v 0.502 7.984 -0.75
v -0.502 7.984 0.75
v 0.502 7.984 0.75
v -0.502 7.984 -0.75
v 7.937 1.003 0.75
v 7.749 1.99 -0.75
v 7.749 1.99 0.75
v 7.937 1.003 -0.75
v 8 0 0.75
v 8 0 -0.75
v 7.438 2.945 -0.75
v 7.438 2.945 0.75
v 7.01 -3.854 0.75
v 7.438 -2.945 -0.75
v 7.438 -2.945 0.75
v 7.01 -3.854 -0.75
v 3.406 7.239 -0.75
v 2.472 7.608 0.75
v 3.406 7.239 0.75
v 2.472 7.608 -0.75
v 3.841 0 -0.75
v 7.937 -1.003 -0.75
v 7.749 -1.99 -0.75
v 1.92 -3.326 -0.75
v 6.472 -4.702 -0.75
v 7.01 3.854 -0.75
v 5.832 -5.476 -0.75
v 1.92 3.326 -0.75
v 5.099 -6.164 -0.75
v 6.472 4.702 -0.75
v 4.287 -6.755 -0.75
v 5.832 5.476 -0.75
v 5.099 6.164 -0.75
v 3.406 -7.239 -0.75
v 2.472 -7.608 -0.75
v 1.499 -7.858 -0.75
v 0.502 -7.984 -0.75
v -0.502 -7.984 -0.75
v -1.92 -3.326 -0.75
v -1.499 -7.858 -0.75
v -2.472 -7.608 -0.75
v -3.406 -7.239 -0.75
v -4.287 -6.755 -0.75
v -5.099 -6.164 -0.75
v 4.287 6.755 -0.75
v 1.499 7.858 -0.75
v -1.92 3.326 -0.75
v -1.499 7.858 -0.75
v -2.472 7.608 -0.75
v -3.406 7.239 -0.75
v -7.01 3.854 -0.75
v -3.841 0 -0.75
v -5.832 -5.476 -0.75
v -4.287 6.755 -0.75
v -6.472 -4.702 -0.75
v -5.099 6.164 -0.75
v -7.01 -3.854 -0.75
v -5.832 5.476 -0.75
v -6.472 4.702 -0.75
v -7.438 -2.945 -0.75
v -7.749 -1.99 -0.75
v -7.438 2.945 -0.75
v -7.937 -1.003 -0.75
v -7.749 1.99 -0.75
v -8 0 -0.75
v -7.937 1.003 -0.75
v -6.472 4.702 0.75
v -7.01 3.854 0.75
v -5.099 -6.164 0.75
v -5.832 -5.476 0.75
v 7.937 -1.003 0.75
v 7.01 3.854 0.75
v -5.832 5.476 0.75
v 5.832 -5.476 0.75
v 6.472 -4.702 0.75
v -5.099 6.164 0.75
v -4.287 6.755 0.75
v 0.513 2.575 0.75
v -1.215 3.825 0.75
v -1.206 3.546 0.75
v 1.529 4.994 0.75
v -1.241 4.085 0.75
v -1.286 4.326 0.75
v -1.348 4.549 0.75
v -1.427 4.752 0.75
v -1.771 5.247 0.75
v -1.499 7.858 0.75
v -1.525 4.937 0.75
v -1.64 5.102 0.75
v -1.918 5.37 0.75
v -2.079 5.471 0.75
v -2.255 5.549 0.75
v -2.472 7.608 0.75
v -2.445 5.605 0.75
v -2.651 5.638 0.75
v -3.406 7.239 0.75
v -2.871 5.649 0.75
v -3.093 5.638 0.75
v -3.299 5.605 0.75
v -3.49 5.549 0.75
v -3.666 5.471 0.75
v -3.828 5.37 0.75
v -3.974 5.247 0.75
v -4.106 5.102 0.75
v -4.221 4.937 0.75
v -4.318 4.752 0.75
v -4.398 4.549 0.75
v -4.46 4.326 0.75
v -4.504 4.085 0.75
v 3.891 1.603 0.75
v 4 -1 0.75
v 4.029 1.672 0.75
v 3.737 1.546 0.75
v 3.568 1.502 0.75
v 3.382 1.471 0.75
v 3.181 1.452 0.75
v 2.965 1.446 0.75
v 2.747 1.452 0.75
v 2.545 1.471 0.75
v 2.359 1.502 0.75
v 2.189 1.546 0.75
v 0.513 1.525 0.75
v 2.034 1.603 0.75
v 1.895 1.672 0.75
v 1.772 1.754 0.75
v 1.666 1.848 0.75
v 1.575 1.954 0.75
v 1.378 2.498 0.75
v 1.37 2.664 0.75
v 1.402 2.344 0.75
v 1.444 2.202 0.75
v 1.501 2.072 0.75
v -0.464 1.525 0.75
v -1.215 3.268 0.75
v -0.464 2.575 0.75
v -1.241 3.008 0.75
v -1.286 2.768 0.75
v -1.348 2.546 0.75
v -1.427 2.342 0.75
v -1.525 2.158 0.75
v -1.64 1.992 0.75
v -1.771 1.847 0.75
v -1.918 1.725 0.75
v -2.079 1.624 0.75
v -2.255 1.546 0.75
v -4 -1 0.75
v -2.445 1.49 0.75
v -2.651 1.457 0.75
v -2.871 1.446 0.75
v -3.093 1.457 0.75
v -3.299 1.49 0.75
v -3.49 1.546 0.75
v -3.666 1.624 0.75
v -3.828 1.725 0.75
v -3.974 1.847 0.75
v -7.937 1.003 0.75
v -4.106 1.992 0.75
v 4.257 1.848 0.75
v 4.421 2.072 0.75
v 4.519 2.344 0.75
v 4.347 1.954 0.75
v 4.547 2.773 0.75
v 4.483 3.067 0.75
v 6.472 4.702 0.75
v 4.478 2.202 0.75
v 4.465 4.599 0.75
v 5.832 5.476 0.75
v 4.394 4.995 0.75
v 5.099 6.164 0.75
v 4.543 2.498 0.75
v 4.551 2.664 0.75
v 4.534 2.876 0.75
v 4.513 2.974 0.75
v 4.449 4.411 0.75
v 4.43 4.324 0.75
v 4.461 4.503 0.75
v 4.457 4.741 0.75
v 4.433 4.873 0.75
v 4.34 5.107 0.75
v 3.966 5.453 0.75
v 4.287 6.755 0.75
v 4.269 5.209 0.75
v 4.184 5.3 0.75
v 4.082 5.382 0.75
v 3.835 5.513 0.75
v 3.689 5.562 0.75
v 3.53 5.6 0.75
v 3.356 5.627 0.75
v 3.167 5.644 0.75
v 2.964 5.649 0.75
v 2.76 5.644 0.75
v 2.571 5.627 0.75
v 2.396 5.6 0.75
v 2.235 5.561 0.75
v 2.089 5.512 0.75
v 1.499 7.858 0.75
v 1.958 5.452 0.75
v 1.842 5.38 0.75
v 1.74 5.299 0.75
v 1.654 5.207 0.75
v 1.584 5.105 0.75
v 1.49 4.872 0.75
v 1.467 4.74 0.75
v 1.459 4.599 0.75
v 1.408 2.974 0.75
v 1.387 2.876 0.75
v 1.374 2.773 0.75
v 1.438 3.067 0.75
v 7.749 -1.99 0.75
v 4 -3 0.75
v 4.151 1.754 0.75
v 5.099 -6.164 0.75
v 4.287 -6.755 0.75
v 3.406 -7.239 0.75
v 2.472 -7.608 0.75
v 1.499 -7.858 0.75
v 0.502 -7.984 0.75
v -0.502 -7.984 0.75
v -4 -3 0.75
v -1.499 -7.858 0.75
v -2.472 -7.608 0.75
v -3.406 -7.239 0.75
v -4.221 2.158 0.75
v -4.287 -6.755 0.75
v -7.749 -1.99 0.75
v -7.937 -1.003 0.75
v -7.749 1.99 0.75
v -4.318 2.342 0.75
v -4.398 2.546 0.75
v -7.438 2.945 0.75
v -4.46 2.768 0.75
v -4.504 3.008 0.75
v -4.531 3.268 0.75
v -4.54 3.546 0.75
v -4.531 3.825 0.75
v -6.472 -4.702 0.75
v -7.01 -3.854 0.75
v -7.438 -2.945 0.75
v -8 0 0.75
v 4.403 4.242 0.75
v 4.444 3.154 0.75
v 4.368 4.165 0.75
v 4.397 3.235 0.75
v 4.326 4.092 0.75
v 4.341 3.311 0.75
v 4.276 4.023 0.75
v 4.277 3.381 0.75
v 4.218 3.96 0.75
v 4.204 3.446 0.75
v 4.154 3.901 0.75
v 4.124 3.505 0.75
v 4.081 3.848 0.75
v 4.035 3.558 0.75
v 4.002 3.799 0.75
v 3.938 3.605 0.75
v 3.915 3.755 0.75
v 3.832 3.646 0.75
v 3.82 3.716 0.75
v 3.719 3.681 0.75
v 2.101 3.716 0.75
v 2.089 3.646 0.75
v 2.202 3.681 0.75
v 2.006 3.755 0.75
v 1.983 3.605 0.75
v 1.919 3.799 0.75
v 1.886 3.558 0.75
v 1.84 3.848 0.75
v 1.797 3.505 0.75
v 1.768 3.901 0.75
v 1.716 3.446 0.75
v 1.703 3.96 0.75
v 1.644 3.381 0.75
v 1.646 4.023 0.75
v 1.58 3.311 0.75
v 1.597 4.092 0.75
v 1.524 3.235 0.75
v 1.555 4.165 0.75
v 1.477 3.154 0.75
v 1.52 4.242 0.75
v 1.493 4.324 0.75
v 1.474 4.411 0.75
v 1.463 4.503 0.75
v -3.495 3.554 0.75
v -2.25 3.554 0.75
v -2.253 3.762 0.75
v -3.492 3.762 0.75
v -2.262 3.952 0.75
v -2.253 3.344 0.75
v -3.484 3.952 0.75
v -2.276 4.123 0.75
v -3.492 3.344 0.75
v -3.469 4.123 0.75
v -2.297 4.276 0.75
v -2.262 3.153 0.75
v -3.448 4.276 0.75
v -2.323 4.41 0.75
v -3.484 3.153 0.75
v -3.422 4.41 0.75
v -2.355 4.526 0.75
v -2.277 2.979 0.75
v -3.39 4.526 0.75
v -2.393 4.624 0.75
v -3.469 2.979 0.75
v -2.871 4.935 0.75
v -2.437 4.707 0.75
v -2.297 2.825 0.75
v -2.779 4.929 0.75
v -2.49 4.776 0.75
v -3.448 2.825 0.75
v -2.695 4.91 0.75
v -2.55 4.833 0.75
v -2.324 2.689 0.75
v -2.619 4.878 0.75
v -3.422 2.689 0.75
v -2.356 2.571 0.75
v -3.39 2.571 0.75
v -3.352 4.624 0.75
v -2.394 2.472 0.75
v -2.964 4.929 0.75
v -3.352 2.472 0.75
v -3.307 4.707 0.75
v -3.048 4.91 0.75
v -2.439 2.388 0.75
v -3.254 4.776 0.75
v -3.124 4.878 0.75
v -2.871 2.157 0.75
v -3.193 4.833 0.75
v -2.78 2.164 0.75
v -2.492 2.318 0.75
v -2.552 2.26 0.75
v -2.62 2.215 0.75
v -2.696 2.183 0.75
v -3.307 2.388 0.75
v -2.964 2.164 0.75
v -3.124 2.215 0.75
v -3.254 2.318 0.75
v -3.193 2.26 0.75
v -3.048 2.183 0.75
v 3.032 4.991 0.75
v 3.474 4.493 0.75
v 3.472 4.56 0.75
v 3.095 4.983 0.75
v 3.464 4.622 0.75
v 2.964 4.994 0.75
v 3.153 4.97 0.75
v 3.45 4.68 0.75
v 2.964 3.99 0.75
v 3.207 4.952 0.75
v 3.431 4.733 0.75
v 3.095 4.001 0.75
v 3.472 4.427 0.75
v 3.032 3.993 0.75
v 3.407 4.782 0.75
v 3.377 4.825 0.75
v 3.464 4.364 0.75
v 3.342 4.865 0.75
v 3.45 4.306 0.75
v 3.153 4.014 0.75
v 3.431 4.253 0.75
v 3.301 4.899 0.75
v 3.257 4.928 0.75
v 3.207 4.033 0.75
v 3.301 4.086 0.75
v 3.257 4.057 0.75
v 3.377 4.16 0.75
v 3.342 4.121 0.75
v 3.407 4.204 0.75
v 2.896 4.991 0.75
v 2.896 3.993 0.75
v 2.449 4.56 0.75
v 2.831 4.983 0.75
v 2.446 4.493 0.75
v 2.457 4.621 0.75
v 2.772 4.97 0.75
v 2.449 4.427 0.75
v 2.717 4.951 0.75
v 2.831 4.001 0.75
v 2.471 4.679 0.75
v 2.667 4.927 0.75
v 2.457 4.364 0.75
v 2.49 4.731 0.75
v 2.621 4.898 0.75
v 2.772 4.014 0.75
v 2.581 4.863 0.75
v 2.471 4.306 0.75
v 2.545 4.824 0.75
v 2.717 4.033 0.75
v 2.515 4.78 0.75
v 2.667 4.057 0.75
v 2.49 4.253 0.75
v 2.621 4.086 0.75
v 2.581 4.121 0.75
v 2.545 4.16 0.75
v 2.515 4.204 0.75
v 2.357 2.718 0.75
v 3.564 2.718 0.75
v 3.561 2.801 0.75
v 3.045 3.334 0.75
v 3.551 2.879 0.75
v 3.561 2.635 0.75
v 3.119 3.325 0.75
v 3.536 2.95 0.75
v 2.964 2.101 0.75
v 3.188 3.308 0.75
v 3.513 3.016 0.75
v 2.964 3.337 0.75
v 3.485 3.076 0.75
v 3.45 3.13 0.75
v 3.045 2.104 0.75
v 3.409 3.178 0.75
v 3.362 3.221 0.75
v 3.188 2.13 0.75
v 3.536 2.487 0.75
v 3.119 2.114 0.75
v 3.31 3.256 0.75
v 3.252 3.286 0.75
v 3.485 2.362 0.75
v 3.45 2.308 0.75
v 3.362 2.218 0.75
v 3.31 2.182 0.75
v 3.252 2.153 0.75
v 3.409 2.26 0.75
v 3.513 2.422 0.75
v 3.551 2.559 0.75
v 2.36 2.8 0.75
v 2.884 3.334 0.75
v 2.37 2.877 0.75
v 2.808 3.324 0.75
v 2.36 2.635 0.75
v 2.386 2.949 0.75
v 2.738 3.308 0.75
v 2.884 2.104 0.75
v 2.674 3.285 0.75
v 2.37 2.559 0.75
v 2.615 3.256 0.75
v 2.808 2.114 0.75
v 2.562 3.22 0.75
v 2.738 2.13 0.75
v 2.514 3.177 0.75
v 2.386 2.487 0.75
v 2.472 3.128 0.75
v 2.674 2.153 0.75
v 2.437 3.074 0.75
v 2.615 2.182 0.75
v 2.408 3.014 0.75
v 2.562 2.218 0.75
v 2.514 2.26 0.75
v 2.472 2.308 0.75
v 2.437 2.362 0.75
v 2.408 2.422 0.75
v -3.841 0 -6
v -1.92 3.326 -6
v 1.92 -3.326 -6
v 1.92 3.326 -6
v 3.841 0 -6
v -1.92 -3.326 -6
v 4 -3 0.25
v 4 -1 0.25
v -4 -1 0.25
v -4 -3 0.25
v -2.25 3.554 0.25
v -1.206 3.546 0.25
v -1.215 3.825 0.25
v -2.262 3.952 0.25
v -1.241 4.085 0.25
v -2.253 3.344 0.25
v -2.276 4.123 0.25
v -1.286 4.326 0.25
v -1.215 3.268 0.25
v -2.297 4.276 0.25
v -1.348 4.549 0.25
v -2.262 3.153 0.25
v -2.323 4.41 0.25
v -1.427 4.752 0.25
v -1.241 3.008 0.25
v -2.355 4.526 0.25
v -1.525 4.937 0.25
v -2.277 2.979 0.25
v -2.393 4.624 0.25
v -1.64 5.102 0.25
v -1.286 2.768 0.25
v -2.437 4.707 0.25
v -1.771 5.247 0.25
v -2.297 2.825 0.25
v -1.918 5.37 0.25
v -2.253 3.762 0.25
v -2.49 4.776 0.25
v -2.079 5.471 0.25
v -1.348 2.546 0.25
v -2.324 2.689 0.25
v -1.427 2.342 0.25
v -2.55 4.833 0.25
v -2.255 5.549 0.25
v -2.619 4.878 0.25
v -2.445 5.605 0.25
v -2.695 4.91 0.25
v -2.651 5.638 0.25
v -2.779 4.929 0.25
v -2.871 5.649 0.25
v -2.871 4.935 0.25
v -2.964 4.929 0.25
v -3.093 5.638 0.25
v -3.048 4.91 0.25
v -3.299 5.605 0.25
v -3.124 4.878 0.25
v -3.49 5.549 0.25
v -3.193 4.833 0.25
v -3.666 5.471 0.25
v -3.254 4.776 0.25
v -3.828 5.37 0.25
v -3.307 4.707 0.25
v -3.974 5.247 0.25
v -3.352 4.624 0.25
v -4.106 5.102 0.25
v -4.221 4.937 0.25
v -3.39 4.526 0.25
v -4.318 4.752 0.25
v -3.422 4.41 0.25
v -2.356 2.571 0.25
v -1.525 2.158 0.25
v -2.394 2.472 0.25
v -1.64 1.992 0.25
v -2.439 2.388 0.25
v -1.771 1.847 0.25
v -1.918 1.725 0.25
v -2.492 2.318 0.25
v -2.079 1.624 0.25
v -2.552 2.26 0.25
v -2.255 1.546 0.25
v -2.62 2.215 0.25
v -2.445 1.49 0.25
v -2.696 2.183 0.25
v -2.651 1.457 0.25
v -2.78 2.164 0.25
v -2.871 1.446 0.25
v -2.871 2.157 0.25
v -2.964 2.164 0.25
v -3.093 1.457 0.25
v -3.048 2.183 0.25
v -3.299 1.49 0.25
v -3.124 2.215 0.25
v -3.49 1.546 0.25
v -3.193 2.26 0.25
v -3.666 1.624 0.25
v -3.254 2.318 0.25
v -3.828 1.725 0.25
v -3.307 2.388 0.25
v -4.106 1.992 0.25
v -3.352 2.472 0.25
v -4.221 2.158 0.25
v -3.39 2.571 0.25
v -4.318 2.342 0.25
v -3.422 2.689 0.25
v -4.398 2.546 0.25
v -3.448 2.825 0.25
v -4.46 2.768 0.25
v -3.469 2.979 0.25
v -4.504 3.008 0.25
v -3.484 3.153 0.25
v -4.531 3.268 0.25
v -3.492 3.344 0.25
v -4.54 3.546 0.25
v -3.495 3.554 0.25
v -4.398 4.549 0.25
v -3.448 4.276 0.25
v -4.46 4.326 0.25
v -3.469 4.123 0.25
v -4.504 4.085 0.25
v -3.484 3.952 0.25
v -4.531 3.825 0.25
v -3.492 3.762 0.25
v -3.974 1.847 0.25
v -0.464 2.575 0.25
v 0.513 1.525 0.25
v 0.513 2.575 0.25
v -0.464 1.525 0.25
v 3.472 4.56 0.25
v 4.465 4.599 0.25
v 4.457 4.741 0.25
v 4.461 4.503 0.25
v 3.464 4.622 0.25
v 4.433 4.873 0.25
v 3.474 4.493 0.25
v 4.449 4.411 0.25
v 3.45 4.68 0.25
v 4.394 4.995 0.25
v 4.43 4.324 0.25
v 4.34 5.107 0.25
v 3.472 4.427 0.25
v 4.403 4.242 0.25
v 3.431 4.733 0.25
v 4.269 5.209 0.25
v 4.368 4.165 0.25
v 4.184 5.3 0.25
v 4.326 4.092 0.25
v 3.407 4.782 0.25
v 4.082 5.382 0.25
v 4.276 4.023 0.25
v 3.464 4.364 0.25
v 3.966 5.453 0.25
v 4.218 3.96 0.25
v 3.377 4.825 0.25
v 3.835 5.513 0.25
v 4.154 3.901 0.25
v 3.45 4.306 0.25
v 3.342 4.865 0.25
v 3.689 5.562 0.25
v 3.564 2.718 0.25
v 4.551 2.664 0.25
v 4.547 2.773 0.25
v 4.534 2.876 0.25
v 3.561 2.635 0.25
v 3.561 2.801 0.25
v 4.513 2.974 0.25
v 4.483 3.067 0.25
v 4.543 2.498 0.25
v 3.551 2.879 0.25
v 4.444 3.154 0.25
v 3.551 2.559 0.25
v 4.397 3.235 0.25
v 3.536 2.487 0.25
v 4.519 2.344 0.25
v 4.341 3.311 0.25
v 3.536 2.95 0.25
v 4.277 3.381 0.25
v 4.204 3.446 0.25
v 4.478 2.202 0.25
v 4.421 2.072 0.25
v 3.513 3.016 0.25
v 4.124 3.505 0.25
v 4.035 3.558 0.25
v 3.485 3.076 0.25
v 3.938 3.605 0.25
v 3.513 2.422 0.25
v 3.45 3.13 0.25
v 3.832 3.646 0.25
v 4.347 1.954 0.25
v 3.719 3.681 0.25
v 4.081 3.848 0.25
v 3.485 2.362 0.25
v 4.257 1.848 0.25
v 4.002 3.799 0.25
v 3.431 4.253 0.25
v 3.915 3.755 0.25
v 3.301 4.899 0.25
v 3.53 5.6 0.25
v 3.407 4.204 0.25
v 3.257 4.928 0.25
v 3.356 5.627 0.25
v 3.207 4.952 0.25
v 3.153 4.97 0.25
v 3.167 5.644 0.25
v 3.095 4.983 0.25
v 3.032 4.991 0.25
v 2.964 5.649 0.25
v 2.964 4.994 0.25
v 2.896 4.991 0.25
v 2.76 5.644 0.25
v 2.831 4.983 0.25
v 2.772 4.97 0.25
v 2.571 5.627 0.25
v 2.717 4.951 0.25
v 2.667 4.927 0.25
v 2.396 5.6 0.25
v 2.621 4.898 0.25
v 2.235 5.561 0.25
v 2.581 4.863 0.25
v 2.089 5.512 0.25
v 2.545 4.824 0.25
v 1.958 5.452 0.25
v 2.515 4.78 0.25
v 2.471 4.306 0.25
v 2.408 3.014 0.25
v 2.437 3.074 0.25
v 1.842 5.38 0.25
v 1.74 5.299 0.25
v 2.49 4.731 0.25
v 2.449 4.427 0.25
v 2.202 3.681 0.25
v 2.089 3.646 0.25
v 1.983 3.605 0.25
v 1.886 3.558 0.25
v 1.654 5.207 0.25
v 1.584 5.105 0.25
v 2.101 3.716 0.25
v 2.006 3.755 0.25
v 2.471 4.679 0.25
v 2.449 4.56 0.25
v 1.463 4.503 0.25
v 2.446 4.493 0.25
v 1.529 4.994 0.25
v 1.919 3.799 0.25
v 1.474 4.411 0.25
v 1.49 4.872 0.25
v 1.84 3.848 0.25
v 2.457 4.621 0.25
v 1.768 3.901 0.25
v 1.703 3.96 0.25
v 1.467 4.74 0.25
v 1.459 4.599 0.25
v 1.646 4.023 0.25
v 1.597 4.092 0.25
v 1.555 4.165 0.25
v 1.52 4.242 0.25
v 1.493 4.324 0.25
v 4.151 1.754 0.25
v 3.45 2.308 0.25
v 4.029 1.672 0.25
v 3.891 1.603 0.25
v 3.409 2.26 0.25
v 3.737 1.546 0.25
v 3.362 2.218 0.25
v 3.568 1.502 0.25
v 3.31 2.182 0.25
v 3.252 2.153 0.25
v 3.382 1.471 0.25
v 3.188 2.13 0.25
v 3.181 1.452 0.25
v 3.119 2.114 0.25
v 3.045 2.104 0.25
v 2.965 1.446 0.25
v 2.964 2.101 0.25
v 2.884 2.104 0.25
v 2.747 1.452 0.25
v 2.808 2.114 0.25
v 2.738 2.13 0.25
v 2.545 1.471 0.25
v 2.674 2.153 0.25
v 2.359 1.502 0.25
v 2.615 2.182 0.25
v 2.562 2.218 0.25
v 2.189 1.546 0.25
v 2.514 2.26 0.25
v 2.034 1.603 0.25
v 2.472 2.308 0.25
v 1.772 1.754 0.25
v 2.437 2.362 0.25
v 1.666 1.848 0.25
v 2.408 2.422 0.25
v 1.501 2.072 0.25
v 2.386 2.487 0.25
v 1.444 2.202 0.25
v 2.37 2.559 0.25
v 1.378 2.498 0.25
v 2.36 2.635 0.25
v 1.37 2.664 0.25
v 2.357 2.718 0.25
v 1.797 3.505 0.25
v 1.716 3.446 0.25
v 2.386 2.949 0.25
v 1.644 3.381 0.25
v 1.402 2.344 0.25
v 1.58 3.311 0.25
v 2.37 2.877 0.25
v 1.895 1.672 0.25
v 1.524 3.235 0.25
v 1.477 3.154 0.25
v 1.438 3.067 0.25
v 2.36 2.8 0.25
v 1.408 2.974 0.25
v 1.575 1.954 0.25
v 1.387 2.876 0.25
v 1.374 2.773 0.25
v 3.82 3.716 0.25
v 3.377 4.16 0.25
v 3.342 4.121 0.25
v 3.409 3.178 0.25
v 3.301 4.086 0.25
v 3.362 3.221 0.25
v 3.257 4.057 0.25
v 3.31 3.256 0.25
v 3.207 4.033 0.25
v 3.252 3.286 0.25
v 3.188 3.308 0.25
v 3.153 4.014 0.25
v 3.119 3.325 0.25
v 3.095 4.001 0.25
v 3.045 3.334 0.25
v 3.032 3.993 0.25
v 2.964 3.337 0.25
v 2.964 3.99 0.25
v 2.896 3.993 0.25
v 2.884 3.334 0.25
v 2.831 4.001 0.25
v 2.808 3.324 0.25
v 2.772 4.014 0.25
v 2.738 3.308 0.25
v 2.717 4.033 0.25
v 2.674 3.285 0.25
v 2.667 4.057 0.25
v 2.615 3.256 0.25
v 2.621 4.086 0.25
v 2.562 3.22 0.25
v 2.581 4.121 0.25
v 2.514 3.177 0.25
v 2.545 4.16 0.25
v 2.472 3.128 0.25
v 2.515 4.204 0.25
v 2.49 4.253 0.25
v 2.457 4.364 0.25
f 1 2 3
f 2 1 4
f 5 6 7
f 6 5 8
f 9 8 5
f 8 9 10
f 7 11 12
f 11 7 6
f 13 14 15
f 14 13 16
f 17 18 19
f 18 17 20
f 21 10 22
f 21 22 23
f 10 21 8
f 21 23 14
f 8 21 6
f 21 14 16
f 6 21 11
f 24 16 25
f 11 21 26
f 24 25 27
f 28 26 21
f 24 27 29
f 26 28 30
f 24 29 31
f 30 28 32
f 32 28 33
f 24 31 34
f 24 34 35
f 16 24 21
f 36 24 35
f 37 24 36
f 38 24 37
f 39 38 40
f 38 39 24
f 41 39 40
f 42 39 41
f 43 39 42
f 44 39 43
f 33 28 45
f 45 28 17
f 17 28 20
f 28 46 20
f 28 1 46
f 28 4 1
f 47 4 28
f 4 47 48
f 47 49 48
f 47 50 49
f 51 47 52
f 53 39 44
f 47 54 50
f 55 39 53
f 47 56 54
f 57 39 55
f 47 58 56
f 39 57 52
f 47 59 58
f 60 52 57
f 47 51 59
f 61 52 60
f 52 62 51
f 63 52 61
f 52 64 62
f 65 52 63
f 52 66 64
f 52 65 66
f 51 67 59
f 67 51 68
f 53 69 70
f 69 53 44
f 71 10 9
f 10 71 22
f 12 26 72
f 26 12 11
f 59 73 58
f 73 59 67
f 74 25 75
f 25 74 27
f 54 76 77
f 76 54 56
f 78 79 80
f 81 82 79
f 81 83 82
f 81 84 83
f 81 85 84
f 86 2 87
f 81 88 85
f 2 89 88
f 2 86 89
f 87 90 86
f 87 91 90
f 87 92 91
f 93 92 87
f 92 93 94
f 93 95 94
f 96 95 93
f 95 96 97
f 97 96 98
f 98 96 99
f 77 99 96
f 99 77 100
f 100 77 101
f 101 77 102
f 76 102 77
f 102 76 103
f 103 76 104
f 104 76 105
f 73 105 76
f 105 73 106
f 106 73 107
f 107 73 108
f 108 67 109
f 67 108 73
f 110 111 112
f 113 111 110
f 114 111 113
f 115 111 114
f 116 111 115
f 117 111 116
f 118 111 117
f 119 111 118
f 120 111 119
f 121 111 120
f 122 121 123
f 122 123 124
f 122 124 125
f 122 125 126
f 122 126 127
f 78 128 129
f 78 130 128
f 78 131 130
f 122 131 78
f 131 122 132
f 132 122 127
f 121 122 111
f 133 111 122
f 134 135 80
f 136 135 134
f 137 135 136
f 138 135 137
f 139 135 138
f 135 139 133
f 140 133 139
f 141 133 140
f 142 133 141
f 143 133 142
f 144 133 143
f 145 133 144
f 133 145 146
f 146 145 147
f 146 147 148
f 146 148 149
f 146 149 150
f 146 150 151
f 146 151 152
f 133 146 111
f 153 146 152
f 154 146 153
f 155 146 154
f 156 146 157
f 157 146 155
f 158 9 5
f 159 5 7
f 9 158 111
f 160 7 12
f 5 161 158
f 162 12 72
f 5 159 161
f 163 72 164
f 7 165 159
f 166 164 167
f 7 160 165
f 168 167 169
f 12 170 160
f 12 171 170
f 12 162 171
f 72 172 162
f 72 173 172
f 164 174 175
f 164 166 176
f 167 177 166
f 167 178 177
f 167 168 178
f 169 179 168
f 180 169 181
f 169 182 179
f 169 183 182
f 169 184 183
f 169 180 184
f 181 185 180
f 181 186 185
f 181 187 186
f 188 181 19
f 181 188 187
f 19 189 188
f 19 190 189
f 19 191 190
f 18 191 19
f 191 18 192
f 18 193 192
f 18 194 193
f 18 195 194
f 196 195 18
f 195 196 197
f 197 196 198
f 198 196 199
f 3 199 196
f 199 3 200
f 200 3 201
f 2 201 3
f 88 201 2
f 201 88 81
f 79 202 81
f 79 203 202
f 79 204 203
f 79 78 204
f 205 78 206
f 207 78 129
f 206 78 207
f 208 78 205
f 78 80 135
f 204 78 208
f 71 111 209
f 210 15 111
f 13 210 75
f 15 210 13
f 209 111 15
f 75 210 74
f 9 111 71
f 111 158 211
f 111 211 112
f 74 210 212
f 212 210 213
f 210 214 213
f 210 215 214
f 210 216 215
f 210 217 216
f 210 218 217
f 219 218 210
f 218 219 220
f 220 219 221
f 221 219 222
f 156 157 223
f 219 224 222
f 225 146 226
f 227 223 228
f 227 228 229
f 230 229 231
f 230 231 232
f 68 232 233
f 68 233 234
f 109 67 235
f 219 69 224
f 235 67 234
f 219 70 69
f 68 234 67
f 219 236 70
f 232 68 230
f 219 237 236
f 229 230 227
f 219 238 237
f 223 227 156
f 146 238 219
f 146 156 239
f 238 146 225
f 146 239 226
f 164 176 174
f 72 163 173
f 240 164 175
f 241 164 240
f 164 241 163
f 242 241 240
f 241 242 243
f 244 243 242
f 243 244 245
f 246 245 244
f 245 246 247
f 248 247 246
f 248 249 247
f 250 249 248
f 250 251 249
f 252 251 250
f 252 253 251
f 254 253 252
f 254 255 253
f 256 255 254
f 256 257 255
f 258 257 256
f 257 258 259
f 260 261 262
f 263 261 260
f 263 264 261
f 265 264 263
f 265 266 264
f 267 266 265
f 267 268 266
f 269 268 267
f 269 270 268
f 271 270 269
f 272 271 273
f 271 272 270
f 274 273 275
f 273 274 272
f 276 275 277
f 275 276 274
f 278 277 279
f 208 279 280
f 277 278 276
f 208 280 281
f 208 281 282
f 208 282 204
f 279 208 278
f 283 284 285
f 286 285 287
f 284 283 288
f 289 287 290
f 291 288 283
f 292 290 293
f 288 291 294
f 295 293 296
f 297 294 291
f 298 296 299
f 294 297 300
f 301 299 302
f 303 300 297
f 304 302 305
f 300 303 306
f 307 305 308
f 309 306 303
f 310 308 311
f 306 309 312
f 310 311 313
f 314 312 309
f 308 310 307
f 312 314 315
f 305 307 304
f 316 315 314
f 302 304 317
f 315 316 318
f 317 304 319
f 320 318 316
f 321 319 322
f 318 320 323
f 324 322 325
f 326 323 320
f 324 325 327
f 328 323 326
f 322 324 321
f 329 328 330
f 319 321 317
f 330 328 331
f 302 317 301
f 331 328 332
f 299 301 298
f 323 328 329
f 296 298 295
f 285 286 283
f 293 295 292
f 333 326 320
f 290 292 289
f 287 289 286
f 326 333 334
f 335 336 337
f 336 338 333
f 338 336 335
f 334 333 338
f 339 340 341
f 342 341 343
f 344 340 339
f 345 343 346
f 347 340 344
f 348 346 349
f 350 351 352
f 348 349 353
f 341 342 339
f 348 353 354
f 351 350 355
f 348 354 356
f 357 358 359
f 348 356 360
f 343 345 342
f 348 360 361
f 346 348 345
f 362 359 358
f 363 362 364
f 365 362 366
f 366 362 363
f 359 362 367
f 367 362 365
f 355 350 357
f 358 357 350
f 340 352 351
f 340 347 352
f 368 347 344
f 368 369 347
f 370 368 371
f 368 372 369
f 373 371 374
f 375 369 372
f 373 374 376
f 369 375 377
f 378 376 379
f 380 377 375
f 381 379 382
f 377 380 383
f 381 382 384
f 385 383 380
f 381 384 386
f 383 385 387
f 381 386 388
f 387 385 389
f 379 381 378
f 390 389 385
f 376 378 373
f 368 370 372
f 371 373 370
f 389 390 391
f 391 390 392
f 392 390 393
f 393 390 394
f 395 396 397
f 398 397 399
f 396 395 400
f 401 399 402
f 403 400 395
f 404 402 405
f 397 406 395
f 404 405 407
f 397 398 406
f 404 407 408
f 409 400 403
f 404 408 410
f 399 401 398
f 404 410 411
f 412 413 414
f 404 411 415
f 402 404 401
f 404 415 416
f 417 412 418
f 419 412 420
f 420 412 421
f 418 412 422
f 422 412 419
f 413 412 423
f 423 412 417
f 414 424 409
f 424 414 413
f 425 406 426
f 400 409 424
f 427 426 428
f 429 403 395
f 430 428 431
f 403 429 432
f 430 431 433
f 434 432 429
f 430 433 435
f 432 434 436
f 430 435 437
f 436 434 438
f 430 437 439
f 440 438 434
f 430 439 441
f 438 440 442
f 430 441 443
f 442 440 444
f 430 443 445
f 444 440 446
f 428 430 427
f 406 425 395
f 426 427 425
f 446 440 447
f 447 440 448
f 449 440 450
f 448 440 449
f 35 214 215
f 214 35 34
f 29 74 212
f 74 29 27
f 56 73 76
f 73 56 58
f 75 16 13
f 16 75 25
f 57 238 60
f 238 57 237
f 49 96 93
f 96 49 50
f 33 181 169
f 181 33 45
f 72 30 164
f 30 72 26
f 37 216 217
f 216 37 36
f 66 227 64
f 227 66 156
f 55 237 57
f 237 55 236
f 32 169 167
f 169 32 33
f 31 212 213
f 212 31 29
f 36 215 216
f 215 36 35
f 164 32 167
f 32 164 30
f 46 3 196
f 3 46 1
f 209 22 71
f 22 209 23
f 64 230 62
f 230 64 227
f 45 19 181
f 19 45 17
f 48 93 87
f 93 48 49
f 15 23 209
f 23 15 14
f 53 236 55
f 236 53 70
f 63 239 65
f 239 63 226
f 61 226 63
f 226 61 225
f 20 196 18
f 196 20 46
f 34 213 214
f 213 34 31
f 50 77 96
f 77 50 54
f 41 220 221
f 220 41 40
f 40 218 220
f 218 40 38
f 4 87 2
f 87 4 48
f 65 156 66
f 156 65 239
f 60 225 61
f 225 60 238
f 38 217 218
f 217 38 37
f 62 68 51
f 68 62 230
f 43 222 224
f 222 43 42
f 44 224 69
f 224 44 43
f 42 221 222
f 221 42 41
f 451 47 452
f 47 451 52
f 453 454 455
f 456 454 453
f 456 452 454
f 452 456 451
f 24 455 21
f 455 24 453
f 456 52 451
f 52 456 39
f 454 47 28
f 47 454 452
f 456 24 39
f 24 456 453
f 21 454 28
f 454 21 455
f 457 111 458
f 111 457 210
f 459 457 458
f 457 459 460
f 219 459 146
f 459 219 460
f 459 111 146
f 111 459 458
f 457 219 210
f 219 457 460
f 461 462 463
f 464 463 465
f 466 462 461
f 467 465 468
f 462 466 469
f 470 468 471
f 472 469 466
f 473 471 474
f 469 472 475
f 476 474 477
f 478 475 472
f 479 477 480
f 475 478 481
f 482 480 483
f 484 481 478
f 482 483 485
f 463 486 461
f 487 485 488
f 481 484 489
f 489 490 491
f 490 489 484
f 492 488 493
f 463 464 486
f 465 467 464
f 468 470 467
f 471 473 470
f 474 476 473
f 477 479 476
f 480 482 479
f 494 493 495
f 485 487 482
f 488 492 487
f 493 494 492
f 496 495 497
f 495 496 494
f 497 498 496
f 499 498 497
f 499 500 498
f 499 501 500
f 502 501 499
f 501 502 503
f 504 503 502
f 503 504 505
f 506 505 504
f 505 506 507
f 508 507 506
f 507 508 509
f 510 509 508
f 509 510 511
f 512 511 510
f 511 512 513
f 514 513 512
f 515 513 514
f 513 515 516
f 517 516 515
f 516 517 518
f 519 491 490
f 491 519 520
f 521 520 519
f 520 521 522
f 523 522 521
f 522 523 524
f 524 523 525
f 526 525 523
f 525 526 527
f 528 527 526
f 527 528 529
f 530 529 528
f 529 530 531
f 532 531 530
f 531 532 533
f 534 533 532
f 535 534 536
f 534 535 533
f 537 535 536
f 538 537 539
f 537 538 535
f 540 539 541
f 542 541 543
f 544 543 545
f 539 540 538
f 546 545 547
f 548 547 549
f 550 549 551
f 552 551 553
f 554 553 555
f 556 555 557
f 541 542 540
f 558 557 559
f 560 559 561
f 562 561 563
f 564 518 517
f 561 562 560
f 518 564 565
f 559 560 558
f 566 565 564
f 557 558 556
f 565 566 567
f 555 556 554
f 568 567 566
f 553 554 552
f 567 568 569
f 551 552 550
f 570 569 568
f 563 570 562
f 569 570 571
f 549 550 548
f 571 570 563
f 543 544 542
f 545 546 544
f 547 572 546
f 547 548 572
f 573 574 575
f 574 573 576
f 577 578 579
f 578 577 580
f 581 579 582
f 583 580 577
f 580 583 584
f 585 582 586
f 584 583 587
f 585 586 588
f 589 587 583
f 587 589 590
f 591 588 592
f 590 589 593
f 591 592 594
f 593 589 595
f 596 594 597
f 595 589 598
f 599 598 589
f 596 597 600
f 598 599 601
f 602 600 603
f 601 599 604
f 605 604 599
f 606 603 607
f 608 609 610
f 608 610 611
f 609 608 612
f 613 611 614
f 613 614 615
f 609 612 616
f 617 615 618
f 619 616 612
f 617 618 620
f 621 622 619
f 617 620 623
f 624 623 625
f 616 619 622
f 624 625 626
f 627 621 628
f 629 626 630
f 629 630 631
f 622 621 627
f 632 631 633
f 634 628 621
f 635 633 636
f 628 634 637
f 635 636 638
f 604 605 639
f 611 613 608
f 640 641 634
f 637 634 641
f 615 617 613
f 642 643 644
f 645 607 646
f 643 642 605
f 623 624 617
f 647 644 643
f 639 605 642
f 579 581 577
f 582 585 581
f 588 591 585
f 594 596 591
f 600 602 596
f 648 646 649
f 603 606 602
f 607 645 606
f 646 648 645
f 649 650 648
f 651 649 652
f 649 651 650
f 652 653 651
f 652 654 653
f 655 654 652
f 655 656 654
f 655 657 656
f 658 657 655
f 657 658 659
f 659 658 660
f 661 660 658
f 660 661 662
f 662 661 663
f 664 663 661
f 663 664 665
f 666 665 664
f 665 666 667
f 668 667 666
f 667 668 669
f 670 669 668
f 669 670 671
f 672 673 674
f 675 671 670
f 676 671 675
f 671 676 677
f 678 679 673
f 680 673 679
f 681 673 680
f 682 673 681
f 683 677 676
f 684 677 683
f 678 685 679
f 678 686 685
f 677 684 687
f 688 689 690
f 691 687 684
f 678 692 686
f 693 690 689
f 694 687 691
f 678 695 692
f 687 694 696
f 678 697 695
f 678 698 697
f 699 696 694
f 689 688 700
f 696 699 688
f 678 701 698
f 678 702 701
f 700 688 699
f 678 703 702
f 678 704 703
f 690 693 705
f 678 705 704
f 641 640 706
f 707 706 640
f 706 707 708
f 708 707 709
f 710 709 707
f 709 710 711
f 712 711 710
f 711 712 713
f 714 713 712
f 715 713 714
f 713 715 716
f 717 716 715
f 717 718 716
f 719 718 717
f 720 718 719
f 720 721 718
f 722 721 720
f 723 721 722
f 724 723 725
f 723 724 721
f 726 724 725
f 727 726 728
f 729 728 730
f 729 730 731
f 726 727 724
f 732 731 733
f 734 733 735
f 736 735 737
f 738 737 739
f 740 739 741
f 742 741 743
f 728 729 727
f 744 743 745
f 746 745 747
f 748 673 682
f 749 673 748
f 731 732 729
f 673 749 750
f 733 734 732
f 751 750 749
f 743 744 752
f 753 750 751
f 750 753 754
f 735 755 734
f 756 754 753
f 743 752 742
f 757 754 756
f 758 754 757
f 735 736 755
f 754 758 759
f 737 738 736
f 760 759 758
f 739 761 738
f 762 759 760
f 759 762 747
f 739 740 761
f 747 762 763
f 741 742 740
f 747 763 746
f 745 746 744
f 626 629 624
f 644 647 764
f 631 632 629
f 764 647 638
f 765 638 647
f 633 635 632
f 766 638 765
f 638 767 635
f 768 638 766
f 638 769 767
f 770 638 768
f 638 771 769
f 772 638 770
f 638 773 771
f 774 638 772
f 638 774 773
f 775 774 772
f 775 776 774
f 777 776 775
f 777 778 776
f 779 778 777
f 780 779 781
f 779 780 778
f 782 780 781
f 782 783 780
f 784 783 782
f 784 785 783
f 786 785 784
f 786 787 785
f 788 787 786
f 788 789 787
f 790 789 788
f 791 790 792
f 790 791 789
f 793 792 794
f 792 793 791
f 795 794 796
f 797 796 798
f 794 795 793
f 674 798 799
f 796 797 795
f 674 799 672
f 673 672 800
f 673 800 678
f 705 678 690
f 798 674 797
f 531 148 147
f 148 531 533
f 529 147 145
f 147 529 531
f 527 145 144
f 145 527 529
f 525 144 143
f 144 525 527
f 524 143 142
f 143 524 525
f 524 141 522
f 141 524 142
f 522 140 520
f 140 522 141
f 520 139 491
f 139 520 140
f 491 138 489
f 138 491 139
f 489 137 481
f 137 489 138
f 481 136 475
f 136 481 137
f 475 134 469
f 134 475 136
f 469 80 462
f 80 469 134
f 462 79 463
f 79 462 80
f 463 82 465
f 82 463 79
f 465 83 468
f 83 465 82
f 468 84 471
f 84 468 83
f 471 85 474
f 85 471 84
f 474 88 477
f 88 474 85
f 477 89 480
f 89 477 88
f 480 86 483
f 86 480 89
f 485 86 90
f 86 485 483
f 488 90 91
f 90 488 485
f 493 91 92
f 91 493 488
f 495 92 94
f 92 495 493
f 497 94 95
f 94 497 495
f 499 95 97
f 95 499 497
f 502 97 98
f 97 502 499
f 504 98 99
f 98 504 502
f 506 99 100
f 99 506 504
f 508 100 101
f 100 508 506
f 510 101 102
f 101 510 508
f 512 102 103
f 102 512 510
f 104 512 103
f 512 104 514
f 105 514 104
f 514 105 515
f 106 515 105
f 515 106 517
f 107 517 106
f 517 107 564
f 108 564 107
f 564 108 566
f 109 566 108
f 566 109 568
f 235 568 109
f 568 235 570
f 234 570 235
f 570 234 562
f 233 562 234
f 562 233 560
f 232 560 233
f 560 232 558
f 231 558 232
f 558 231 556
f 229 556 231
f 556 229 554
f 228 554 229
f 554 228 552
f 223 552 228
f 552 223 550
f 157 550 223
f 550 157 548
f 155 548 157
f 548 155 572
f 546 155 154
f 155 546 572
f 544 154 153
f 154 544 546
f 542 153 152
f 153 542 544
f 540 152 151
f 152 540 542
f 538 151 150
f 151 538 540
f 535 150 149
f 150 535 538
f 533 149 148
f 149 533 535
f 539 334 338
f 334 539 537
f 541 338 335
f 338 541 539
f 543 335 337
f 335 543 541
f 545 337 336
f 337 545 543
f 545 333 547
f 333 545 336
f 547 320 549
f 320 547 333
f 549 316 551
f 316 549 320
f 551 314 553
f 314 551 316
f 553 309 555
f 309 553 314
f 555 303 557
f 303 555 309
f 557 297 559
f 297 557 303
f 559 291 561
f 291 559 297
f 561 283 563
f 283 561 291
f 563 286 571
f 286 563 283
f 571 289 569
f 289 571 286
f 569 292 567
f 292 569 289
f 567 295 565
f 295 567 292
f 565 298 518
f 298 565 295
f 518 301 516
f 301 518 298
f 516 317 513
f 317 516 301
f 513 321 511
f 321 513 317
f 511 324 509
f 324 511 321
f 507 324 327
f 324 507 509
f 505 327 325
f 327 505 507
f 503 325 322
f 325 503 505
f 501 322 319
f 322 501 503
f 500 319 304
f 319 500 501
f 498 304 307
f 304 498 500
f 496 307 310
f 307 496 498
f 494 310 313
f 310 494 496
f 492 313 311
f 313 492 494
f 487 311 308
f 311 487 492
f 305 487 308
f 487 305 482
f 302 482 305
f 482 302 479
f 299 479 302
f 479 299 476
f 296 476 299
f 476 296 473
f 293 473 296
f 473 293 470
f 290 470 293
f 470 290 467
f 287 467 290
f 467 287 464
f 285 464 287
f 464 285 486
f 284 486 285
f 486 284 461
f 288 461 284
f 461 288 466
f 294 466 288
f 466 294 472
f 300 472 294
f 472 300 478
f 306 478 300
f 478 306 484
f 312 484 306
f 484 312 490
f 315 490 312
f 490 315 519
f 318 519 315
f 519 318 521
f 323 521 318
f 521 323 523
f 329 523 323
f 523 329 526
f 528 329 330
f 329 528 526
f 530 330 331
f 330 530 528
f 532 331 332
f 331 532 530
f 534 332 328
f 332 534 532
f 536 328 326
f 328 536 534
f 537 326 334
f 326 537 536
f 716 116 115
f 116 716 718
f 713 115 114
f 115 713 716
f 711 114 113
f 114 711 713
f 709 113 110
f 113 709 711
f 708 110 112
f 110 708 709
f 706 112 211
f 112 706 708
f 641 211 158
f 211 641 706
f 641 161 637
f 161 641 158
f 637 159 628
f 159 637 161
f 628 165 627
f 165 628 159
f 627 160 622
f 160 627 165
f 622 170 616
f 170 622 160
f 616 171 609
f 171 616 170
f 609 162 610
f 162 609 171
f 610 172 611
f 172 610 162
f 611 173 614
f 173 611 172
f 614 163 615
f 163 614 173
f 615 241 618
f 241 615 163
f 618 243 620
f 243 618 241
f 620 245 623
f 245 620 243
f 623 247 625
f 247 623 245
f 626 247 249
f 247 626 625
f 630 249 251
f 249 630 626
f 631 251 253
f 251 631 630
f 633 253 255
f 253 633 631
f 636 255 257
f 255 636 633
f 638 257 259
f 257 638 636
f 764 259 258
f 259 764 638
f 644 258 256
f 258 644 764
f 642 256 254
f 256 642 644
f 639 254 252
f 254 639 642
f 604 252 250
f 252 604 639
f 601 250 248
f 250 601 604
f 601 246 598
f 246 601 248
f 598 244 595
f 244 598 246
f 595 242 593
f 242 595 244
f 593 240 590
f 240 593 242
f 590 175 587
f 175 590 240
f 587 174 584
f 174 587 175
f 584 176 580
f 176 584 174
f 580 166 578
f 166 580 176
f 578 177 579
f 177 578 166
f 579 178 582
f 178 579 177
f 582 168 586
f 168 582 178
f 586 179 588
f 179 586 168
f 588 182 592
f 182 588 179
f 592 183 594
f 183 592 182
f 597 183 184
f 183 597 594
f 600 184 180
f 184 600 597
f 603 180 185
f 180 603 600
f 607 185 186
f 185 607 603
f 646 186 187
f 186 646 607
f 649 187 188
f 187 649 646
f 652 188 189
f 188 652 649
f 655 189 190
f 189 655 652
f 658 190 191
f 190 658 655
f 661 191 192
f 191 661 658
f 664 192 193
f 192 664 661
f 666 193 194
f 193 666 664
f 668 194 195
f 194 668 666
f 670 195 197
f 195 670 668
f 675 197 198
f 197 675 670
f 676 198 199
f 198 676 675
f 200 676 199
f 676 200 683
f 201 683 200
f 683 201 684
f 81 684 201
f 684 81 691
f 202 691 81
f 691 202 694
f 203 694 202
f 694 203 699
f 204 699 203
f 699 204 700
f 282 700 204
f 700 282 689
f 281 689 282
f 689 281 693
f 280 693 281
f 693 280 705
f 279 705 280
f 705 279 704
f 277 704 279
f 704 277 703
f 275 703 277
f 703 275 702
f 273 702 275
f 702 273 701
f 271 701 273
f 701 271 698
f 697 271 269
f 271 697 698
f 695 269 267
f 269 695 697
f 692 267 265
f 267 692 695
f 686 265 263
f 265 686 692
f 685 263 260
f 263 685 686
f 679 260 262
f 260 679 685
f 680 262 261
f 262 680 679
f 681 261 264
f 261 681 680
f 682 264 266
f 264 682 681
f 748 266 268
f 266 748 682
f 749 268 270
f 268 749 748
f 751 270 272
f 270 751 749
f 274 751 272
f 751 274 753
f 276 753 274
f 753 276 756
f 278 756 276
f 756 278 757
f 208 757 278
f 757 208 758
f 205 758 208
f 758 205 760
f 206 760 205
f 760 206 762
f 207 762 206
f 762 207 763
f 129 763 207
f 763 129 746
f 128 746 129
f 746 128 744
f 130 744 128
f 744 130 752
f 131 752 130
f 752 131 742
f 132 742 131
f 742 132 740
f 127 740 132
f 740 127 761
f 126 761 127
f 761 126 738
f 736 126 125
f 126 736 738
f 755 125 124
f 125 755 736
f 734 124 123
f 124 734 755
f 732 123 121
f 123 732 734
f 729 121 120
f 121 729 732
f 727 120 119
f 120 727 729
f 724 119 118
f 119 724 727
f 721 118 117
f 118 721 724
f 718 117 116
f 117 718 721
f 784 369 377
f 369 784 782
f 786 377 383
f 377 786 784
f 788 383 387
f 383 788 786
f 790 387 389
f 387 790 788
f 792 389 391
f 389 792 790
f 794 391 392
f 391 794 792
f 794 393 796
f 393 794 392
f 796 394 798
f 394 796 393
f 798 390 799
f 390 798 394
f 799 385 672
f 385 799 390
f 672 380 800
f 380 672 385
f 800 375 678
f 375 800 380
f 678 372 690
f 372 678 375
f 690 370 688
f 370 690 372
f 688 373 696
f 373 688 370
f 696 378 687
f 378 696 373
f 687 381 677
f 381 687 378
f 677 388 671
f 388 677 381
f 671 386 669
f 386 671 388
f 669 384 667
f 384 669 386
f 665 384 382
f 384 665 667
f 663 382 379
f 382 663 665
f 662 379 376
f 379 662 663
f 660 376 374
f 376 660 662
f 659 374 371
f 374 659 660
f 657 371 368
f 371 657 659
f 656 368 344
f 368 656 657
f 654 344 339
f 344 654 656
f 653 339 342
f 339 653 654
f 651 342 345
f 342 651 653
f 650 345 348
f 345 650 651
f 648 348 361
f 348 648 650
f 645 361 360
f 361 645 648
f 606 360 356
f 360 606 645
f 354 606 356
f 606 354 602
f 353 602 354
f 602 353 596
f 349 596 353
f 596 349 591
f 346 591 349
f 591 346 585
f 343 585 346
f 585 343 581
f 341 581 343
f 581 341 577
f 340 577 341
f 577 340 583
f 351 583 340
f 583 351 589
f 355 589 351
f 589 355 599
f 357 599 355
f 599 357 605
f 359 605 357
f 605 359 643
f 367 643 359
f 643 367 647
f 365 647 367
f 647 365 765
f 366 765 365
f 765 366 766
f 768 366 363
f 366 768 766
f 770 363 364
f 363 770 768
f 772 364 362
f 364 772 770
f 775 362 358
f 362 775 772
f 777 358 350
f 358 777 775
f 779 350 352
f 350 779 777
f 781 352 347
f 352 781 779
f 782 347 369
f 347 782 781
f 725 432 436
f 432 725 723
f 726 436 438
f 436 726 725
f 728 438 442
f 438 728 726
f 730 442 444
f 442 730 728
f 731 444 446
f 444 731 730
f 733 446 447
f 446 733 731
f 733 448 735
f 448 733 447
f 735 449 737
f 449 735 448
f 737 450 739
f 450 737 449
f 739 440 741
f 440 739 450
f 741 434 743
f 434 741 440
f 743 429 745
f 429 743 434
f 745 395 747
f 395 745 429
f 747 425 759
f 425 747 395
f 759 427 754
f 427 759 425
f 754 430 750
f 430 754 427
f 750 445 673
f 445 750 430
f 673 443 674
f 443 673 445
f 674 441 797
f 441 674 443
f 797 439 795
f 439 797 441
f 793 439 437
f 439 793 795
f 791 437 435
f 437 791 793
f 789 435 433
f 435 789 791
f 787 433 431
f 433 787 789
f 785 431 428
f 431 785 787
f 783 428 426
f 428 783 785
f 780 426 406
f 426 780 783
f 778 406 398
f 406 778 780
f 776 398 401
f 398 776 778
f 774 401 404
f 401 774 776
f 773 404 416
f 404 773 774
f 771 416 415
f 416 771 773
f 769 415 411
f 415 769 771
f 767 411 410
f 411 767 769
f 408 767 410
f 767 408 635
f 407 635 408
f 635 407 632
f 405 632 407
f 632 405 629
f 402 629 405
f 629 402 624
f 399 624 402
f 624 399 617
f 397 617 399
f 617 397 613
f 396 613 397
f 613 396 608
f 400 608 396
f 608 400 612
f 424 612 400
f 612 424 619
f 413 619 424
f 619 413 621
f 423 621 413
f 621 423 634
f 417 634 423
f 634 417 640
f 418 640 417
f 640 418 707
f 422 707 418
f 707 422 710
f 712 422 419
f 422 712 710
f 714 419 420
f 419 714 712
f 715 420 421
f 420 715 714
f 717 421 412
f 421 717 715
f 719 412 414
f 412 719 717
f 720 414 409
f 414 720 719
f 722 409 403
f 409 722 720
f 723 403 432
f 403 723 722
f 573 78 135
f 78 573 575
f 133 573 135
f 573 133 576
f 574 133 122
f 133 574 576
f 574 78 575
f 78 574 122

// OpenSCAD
$fn = 50;


difference() {
	union() {
		translate(v = [0, 0, -0.7500000000]) {
			cylinder(h = 1.5000000000, r = 8.0000000000);
		}
		translate(v = [0, 0, -6]) {
			linear_extrude(height = 6) {
				polygon(points = [[3.8408550000, 0.0000000000], [1.9204275000, 3.3262780023], [-1.9204275000, 3.3262780023], [-3.8408550000, 0.0000000000], [-1.9204275000, -3.3262780023], [1.9204275000, -3.3262780023]]);
			}
		}
	}
	union() {
		#translate(v = [-4.0000000000, -3.0000000000, 0.2500000000]) {
			cube(size = [8, 2, 0.5000000000]);
		}
		#translate(v = [0, 3.5000000000, 0.2500000000]) {
			linear_extrude(height = 0.5000000000) {
				text(font = "SegoiUI:Bold", halign = "center", size = 4, text = "0.8", valign = "center");
			}
		}
	}
}
